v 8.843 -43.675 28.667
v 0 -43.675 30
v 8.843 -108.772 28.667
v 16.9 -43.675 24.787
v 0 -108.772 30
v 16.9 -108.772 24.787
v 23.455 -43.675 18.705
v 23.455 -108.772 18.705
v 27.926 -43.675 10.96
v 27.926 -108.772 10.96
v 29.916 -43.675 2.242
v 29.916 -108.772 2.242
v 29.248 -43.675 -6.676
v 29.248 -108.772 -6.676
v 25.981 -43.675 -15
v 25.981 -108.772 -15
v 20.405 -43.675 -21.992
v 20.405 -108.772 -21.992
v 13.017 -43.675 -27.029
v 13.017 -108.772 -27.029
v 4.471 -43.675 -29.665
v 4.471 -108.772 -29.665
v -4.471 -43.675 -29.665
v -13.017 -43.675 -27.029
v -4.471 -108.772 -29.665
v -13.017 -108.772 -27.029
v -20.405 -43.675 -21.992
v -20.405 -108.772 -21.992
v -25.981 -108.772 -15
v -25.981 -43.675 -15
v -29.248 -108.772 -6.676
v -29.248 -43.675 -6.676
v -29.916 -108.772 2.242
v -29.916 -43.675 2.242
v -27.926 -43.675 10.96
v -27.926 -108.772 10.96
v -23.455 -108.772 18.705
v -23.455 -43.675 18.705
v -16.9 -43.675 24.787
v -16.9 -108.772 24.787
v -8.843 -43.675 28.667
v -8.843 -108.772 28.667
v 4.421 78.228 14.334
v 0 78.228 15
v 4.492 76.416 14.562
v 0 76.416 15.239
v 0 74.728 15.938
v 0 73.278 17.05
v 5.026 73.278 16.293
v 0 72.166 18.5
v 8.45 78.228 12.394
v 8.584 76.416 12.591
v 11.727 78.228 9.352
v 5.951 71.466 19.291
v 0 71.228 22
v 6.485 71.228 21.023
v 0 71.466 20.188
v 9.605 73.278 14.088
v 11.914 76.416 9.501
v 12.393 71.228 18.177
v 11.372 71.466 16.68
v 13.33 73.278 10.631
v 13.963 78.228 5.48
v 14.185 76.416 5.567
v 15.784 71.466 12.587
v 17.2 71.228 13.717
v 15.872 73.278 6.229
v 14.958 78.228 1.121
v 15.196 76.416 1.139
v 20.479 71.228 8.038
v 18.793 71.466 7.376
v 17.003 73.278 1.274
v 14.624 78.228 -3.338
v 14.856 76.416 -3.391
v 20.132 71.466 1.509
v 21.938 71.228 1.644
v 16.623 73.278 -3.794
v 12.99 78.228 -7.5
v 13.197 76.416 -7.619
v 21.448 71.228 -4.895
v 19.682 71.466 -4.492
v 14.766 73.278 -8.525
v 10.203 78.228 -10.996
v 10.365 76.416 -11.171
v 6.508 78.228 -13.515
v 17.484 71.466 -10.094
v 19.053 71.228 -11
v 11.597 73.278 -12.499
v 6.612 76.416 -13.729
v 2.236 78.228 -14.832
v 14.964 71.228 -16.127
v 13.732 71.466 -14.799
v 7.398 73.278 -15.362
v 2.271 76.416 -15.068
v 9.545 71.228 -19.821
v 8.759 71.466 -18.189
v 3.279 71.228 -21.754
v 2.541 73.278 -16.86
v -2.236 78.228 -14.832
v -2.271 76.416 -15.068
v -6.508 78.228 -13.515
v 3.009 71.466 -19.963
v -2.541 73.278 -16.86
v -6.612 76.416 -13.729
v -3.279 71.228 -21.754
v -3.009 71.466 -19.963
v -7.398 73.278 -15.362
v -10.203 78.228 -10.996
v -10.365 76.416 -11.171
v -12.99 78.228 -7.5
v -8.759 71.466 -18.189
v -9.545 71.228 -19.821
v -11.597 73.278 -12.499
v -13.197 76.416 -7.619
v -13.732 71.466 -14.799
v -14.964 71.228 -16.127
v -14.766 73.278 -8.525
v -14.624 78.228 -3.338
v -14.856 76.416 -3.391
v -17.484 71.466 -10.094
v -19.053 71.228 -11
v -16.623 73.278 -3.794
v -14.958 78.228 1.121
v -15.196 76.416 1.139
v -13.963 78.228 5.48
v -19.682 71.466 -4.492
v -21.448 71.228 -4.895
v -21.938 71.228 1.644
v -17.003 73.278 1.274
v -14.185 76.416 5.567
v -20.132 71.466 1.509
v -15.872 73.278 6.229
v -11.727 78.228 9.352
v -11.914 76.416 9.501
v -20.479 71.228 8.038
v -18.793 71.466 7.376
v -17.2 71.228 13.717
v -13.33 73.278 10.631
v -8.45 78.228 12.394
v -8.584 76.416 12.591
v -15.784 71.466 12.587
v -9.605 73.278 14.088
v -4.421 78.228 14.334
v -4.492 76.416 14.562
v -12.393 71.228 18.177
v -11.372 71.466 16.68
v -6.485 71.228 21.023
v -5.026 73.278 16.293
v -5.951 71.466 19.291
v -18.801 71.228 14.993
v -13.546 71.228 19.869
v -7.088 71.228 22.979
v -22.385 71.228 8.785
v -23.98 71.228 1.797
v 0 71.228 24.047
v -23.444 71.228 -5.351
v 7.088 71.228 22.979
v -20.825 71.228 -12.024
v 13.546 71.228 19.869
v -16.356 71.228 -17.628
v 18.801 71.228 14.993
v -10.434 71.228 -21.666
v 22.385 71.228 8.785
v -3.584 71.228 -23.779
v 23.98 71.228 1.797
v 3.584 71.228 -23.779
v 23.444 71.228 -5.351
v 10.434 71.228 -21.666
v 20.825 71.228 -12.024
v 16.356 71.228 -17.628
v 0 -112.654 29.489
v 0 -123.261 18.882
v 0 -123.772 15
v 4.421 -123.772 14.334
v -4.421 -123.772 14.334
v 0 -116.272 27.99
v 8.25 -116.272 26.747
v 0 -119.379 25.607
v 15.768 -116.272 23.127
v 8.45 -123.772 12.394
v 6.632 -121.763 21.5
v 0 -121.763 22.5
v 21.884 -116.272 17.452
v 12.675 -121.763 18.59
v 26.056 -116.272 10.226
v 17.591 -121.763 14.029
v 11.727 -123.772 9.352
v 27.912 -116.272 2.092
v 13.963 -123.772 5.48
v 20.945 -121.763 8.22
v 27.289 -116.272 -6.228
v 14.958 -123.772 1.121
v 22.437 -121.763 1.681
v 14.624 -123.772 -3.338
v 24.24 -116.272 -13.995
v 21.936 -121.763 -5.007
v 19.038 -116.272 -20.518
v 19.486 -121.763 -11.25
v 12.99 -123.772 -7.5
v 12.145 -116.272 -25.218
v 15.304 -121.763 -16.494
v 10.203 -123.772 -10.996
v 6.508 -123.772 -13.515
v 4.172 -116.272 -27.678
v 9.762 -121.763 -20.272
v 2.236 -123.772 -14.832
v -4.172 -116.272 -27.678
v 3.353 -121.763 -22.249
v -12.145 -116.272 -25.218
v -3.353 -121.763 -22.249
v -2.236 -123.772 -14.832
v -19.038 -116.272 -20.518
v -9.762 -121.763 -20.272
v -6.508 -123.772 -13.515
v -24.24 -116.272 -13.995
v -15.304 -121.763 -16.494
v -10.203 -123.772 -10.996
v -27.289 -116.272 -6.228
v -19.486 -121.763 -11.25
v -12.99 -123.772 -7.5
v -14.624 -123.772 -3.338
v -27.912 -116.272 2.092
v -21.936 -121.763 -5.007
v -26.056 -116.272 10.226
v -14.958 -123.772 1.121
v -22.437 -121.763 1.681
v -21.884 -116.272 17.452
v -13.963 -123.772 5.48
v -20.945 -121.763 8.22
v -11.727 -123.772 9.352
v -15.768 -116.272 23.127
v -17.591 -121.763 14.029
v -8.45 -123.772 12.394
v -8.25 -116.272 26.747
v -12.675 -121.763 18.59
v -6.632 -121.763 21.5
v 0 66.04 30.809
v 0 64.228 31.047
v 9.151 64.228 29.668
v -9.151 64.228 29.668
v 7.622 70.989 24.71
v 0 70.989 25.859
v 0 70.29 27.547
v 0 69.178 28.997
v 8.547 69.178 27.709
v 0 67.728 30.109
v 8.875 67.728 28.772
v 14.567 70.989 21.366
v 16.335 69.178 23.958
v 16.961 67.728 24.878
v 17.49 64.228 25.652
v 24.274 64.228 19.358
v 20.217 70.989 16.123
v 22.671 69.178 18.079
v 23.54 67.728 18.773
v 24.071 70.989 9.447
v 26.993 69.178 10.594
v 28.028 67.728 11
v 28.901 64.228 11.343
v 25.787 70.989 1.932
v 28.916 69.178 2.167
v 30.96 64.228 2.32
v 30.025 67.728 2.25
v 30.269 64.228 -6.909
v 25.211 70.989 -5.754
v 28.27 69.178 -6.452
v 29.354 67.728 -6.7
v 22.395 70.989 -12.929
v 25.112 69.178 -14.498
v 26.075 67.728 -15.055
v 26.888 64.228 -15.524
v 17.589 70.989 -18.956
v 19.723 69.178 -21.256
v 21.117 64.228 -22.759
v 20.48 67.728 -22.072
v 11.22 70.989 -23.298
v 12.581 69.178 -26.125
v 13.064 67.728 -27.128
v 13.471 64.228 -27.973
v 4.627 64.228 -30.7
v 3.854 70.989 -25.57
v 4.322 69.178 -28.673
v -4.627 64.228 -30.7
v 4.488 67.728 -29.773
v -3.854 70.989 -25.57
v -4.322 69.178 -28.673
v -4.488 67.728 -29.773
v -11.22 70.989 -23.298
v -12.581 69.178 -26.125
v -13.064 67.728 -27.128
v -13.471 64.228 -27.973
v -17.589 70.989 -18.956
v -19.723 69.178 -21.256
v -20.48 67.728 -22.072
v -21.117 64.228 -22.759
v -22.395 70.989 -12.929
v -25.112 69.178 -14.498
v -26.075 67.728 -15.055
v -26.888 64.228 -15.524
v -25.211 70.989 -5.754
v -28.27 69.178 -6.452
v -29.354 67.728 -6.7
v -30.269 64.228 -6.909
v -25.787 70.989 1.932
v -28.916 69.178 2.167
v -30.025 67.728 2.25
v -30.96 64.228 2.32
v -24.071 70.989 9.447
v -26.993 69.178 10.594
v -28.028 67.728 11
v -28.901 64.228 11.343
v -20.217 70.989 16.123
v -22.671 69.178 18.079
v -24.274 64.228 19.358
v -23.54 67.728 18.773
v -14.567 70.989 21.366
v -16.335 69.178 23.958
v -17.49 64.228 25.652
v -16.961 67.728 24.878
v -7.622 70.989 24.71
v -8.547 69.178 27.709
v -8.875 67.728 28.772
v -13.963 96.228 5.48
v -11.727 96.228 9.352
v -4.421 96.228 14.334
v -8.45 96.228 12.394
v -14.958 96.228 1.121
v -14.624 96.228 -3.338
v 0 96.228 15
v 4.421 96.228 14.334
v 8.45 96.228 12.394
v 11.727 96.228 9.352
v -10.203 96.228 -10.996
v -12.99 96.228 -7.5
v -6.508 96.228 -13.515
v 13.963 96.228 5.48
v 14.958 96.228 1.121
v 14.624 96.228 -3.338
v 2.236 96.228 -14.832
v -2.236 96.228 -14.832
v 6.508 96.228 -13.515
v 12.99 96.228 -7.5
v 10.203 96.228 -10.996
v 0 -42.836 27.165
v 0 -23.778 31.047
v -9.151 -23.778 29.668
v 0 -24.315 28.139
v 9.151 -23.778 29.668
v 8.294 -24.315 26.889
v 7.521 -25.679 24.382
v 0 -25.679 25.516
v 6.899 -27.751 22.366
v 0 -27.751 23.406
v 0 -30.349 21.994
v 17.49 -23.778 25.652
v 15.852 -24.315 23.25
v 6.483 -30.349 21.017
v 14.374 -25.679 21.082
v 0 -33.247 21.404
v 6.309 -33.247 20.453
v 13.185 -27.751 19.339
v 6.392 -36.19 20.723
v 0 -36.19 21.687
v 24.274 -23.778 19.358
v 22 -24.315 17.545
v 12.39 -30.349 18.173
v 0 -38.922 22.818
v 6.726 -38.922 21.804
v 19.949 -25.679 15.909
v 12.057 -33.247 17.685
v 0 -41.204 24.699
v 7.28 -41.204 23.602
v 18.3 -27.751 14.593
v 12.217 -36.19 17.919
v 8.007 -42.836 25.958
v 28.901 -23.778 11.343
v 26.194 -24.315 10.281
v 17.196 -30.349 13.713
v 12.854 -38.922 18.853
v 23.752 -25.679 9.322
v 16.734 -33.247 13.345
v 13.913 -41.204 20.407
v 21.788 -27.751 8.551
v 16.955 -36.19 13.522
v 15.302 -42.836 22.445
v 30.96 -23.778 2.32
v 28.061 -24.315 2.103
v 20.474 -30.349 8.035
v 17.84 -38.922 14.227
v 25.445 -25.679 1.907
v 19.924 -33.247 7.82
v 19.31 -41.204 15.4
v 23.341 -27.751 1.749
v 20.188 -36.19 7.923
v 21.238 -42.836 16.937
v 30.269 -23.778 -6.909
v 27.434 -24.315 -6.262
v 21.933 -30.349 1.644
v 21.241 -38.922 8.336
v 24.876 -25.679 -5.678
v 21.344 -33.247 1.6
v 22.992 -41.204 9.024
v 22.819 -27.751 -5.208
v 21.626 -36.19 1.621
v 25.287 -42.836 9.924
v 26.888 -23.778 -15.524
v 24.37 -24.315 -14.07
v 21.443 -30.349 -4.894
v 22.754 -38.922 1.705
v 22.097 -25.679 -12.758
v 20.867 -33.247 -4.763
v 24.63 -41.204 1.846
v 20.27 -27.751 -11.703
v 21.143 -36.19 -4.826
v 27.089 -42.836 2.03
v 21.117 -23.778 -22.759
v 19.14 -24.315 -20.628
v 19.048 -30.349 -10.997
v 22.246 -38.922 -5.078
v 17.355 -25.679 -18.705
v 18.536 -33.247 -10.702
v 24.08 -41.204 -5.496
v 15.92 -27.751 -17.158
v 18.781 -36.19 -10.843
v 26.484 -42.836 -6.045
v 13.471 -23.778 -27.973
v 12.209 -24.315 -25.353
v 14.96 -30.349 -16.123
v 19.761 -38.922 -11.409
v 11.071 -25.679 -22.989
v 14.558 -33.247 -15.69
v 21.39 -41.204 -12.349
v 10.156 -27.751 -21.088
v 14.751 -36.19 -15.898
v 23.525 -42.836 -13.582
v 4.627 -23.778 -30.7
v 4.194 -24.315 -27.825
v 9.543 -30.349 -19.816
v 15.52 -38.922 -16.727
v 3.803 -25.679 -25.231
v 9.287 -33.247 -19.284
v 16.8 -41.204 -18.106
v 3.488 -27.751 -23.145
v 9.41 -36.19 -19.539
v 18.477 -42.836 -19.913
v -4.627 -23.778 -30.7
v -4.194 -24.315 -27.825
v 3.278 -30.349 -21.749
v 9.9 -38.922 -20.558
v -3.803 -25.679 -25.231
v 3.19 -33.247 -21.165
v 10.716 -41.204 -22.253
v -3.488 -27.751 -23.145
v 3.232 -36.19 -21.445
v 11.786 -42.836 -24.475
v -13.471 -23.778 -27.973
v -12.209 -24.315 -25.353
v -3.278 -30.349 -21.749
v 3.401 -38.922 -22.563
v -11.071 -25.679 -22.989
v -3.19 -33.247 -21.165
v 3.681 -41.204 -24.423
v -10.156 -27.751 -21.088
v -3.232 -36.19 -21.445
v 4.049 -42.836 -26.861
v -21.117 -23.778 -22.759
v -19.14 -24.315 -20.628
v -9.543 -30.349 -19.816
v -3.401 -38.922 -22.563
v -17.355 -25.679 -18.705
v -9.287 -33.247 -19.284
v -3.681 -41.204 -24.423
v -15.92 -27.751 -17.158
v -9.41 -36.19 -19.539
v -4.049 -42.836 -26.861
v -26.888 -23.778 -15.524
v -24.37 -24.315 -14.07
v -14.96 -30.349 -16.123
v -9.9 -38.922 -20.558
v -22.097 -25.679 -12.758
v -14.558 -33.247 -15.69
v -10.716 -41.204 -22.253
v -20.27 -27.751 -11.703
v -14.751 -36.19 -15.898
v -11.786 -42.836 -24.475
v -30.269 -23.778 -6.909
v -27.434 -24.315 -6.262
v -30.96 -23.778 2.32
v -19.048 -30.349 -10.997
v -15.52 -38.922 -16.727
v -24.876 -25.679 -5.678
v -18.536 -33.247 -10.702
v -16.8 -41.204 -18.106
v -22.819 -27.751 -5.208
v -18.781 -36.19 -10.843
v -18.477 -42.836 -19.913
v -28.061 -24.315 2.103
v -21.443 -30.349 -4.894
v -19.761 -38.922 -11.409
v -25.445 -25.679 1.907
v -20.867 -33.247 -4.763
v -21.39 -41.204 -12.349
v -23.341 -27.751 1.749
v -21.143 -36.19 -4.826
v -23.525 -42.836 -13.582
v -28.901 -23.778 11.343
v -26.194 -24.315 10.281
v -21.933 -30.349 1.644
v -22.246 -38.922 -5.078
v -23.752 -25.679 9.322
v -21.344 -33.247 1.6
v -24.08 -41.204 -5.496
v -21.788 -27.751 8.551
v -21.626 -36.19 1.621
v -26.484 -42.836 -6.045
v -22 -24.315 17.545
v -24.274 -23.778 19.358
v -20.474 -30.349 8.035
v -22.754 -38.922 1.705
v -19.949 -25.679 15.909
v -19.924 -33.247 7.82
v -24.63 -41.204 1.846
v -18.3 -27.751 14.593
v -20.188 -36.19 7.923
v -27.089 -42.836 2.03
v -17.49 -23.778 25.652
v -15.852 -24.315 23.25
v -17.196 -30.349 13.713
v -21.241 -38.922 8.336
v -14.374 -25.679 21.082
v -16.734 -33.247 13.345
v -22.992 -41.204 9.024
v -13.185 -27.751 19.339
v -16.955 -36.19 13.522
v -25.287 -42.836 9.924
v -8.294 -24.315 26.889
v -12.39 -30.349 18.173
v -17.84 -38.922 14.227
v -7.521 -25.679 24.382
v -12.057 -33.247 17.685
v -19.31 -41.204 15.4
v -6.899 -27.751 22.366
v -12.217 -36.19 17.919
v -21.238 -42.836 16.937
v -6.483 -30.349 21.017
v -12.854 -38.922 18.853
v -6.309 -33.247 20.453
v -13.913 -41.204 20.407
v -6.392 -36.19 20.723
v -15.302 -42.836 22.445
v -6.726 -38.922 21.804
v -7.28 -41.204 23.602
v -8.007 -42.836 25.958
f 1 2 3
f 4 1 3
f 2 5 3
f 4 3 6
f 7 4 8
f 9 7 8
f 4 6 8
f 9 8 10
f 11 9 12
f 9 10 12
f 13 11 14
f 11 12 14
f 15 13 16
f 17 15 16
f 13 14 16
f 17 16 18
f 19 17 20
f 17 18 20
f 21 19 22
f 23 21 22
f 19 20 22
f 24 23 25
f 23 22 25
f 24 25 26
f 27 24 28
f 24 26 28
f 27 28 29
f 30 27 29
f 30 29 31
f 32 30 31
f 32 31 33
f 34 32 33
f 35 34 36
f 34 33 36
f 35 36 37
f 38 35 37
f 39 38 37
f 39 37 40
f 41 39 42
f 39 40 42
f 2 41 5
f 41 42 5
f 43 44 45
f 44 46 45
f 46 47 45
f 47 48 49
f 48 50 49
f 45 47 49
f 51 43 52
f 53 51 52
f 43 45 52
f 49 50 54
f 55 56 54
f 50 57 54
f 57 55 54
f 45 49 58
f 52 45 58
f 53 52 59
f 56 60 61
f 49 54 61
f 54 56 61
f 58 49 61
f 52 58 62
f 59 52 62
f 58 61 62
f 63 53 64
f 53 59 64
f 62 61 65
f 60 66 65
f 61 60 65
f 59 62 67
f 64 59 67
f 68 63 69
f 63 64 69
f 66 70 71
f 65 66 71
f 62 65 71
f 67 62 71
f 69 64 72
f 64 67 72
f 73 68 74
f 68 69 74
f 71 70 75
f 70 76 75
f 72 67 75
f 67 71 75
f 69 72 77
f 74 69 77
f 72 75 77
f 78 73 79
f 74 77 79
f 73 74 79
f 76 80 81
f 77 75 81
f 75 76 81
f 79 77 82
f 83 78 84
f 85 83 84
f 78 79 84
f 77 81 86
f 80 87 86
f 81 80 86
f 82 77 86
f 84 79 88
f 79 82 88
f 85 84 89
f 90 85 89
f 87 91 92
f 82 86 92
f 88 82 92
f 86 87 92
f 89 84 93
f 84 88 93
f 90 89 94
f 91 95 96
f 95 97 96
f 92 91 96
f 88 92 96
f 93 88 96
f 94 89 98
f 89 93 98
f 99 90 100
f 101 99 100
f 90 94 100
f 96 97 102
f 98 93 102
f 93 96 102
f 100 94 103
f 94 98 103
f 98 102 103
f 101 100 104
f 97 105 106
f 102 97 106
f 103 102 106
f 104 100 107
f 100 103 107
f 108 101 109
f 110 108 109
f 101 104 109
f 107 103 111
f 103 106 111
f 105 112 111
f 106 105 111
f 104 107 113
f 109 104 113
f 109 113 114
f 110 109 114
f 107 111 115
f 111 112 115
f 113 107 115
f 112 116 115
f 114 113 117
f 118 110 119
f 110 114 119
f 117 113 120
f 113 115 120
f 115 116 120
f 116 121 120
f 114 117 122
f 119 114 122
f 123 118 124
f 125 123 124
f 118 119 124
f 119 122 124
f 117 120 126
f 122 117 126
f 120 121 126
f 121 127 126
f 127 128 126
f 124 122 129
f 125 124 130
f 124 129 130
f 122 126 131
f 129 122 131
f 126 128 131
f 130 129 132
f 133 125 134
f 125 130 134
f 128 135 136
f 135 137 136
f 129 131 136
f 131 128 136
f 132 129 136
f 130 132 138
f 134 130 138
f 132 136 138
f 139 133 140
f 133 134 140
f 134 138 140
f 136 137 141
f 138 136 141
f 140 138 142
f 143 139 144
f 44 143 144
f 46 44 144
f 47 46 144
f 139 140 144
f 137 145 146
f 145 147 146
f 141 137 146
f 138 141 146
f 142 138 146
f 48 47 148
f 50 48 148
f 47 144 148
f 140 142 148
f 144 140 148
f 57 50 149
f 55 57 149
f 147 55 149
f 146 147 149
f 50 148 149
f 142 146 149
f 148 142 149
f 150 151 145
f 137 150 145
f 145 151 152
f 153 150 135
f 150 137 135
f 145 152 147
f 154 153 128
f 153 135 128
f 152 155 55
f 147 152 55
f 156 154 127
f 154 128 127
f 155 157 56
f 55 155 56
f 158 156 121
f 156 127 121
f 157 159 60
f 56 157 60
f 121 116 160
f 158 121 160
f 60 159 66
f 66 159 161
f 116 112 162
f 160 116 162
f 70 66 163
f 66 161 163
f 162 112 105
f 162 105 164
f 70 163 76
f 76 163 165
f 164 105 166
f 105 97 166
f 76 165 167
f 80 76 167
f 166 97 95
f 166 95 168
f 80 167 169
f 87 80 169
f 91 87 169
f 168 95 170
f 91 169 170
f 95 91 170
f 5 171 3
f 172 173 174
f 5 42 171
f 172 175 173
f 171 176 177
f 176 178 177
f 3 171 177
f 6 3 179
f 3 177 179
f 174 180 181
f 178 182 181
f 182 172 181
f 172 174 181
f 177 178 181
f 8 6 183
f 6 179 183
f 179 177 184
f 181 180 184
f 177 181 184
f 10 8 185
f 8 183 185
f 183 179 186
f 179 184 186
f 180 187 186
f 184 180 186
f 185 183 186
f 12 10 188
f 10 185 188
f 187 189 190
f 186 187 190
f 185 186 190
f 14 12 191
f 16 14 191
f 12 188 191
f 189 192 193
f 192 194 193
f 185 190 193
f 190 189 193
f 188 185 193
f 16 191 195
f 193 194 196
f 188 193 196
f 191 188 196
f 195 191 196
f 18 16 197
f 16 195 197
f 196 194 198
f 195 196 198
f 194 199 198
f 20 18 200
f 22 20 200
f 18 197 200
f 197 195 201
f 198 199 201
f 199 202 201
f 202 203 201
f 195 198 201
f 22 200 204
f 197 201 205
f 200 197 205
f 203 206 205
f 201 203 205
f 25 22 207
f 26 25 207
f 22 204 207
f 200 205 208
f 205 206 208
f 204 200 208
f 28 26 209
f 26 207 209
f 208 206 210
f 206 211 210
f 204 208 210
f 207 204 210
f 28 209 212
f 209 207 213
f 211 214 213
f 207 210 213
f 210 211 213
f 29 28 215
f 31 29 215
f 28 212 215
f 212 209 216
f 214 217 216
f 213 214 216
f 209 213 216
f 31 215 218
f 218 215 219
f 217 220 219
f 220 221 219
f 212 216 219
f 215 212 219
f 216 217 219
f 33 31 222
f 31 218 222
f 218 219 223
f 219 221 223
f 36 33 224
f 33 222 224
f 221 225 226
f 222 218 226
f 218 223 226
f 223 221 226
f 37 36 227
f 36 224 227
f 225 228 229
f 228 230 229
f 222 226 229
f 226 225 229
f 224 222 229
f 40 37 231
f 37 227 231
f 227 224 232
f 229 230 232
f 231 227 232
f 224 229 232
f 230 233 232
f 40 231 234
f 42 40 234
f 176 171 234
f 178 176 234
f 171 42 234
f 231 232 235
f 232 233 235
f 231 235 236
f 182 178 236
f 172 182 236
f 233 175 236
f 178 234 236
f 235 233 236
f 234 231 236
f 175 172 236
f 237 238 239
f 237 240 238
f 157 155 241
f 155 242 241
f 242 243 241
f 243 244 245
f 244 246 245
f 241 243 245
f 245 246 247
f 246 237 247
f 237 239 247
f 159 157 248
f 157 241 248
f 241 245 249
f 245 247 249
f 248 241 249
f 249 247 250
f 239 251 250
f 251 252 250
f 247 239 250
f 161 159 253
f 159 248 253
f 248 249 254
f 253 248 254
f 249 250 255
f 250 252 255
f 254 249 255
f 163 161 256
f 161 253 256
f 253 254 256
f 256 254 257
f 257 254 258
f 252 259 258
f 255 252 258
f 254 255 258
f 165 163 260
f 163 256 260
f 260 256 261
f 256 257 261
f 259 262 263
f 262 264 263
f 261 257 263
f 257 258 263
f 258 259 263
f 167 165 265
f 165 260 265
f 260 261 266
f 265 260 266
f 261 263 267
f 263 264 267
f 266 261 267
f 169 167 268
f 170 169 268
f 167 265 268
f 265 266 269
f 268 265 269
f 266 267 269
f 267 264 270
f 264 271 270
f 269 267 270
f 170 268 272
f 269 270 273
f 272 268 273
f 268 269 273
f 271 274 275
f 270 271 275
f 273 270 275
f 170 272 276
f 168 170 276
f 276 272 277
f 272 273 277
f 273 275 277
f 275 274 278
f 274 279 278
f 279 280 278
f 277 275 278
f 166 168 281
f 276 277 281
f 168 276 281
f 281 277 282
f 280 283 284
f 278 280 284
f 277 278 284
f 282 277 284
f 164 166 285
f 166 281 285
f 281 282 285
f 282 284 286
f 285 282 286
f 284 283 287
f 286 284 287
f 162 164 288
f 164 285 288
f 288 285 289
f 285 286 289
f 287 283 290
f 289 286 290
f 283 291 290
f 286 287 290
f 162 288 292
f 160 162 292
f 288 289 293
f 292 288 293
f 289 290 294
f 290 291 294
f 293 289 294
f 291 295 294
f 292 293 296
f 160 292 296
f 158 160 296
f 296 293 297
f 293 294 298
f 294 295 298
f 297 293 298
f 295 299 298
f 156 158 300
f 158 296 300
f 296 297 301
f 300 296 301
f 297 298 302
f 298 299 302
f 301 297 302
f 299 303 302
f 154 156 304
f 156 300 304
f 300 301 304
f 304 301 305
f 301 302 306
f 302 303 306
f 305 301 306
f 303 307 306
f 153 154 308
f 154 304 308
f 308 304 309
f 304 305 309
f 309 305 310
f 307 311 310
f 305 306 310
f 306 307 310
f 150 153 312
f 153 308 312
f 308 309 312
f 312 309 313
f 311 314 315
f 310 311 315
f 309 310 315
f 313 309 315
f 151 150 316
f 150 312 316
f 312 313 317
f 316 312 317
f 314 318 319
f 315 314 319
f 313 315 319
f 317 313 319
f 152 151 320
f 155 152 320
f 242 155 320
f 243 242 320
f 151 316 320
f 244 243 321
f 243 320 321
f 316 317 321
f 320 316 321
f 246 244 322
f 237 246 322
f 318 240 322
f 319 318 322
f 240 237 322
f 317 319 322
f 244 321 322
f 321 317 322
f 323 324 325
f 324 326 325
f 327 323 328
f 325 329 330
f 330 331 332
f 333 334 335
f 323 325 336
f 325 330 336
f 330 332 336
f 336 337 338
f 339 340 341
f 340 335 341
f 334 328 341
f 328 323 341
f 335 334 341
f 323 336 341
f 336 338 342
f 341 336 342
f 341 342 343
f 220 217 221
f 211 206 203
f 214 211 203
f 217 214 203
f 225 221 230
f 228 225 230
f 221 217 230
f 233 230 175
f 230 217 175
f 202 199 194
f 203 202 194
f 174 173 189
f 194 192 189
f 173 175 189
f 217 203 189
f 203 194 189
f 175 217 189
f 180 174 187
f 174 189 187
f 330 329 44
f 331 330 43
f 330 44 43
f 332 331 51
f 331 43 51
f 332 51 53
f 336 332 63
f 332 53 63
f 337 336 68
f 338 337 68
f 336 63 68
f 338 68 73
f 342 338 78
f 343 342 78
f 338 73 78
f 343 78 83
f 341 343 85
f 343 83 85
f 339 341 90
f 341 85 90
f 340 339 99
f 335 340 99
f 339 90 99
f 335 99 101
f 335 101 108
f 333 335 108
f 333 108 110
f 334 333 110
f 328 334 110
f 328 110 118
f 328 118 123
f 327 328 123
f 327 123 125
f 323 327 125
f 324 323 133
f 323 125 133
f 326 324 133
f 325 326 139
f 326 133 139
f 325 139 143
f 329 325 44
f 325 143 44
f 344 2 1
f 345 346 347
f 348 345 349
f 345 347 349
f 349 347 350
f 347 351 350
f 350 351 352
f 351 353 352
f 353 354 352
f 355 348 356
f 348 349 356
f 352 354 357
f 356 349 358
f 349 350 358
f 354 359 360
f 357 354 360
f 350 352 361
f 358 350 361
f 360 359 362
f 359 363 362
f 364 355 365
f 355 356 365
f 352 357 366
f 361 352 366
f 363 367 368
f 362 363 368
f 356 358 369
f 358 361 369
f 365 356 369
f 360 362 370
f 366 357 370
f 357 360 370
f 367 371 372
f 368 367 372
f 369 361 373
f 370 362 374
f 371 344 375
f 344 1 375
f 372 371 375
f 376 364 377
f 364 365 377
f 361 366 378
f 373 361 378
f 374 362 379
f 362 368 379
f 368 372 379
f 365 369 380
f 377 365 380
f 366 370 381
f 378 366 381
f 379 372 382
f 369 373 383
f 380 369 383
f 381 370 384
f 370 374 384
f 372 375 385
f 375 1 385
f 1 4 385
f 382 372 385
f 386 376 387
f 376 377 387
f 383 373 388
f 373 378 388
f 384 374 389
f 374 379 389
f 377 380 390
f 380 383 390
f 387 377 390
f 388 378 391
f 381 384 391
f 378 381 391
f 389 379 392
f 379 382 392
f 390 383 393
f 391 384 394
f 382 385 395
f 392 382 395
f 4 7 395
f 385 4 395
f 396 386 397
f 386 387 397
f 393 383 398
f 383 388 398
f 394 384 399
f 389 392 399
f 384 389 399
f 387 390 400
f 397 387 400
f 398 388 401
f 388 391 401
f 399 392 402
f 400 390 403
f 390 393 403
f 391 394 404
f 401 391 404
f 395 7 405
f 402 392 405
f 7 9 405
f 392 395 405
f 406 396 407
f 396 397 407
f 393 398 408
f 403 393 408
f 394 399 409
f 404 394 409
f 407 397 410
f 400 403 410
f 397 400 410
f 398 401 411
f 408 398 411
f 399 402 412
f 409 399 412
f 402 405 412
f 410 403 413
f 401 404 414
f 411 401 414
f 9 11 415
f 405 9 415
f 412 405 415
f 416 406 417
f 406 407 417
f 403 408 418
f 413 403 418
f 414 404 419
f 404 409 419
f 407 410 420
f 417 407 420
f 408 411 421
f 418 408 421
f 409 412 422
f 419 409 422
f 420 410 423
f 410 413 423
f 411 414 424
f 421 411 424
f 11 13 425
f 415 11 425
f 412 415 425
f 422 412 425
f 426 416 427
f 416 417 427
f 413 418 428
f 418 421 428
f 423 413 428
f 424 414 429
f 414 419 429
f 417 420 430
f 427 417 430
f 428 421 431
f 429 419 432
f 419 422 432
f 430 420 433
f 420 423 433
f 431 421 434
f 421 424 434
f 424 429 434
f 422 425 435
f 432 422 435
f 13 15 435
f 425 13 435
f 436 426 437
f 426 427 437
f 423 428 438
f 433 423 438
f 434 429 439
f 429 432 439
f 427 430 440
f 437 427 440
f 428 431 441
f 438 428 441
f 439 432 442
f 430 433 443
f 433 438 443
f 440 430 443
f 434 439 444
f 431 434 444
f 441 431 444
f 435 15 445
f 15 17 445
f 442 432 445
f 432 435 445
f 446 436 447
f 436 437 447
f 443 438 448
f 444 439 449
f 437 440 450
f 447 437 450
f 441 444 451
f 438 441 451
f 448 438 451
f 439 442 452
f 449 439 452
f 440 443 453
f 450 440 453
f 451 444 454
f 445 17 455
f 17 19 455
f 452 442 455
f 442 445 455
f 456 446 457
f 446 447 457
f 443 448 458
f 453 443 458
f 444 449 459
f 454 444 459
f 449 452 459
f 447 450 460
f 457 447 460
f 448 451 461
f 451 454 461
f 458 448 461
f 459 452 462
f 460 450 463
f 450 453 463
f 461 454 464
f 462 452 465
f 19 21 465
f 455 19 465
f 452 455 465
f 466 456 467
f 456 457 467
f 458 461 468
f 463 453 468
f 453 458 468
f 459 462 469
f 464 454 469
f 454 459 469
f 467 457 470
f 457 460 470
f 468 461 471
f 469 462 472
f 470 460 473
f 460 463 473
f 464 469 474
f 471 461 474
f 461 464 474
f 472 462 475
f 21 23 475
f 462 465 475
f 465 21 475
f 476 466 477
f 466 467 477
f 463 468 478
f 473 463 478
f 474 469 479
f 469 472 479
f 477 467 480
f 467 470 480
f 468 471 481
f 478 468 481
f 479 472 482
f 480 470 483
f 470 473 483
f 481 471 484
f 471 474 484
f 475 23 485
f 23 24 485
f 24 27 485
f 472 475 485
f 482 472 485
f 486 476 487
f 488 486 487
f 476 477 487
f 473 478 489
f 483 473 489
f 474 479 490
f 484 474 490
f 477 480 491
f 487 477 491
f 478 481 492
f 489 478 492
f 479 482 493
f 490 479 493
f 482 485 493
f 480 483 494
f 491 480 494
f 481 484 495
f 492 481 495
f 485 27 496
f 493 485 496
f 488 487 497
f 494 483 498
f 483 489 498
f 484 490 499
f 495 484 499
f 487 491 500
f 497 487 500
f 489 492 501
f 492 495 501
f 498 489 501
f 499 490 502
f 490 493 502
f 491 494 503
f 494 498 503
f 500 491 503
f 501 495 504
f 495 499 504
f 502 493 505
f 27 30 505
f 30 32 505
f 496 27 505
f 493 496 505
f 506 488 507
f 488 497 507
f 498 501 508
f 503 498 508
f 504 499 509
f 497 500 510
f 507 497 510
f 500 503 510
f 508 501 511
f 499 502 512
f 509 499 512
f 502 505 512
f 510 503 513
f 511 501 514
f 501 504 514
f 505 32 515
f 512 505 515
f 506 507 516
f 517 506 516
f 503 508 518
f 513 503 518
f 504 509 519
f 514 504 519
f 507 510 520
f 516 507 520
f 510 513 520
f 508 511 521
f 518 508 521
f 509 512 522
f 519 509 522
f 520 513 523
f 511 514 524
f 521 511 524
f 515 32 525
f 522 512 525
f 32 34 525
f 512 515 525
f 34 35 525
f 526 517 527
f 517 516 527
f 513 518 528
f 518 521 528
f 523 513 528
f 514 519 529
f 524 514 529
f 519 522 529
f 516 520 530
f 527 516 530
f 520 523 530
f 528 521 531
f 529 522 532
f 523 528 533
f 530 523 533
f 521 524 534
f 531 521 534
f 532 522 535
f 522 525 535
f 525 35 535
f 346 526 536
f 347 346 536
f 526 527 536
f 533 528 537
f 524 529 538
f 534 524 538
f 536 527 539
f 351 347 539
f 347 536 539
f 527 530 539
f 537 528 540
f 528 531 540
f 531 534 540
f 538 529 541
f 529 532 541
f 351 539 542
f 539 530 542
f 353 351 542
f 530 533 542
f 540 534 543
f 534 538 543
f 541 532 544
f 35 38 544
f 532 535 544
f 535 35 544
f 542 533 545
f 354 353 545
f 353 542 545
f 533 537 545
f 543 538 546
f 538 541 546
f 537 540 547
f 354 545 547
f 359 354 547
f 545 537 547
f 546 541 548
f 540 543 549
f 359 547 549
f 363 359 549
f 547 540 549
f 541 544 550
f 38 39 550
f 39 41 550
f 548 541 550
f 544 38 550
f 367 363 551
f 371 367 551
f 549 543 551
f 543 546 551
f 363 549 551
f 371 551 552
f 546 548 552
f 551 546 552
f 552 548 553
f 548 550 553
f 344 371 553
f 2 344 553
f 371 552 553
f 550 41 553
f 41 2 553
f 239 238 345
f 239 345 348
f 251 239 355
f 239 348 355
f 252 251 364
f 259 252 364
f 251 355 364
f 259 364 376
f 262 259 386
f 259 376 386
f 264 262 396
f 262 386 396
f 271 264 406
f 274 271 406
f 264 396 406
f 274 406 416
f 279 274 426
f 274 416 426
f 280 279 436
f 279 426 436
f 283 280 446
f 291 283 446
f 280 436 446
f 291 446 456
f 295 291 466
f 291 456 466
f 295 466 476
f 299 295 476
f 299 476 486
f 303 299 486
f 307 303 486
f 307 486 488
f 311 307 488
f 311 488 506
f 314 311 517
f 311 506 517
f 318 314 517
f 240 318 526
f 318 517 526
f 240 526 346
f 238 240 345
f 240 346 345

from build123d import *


with BuildPart() as f1:
    # F0 (on Right) → F1 (revolve)
    with BuildSketch(Plane.YZ):
        with BuildLine():
            Line((-123.77214, 15), (-123.77214, 0))
            Line((-123.77214, 0), (96.22786, 0))
            Line((96.22786, 0), (96.22786, 15))
            Line((96.22786, 15), (78.22786, 15))
            ThreePointArc((78.22786, 15), (73.278113, 17.050253), (71.22786, 22))
            Line((71.22786, 22), (71.22786, 24.047213))
            ThreePointArc((71.22786, 24.047213), (69.177608, 28.996961), (64.22786, 31.047213))
            Line((64.22786, 31.047213), (-23.778022, 31.047213))
            ThreePointArc((-23.778022, 31.047213), (-33.246551, 21.403982), (-43.675041, 30))
            Line((-43.675041, 30), (-108.77214, 30))
            ThreePointArc((-108.77214, 30), (-119.378742, 25.606602), (-123.77214, 15))
        make_face()
    revolve(axis=Axis((0, 76.22786, 0), (0, 1, 0)))


solid = f1.part
